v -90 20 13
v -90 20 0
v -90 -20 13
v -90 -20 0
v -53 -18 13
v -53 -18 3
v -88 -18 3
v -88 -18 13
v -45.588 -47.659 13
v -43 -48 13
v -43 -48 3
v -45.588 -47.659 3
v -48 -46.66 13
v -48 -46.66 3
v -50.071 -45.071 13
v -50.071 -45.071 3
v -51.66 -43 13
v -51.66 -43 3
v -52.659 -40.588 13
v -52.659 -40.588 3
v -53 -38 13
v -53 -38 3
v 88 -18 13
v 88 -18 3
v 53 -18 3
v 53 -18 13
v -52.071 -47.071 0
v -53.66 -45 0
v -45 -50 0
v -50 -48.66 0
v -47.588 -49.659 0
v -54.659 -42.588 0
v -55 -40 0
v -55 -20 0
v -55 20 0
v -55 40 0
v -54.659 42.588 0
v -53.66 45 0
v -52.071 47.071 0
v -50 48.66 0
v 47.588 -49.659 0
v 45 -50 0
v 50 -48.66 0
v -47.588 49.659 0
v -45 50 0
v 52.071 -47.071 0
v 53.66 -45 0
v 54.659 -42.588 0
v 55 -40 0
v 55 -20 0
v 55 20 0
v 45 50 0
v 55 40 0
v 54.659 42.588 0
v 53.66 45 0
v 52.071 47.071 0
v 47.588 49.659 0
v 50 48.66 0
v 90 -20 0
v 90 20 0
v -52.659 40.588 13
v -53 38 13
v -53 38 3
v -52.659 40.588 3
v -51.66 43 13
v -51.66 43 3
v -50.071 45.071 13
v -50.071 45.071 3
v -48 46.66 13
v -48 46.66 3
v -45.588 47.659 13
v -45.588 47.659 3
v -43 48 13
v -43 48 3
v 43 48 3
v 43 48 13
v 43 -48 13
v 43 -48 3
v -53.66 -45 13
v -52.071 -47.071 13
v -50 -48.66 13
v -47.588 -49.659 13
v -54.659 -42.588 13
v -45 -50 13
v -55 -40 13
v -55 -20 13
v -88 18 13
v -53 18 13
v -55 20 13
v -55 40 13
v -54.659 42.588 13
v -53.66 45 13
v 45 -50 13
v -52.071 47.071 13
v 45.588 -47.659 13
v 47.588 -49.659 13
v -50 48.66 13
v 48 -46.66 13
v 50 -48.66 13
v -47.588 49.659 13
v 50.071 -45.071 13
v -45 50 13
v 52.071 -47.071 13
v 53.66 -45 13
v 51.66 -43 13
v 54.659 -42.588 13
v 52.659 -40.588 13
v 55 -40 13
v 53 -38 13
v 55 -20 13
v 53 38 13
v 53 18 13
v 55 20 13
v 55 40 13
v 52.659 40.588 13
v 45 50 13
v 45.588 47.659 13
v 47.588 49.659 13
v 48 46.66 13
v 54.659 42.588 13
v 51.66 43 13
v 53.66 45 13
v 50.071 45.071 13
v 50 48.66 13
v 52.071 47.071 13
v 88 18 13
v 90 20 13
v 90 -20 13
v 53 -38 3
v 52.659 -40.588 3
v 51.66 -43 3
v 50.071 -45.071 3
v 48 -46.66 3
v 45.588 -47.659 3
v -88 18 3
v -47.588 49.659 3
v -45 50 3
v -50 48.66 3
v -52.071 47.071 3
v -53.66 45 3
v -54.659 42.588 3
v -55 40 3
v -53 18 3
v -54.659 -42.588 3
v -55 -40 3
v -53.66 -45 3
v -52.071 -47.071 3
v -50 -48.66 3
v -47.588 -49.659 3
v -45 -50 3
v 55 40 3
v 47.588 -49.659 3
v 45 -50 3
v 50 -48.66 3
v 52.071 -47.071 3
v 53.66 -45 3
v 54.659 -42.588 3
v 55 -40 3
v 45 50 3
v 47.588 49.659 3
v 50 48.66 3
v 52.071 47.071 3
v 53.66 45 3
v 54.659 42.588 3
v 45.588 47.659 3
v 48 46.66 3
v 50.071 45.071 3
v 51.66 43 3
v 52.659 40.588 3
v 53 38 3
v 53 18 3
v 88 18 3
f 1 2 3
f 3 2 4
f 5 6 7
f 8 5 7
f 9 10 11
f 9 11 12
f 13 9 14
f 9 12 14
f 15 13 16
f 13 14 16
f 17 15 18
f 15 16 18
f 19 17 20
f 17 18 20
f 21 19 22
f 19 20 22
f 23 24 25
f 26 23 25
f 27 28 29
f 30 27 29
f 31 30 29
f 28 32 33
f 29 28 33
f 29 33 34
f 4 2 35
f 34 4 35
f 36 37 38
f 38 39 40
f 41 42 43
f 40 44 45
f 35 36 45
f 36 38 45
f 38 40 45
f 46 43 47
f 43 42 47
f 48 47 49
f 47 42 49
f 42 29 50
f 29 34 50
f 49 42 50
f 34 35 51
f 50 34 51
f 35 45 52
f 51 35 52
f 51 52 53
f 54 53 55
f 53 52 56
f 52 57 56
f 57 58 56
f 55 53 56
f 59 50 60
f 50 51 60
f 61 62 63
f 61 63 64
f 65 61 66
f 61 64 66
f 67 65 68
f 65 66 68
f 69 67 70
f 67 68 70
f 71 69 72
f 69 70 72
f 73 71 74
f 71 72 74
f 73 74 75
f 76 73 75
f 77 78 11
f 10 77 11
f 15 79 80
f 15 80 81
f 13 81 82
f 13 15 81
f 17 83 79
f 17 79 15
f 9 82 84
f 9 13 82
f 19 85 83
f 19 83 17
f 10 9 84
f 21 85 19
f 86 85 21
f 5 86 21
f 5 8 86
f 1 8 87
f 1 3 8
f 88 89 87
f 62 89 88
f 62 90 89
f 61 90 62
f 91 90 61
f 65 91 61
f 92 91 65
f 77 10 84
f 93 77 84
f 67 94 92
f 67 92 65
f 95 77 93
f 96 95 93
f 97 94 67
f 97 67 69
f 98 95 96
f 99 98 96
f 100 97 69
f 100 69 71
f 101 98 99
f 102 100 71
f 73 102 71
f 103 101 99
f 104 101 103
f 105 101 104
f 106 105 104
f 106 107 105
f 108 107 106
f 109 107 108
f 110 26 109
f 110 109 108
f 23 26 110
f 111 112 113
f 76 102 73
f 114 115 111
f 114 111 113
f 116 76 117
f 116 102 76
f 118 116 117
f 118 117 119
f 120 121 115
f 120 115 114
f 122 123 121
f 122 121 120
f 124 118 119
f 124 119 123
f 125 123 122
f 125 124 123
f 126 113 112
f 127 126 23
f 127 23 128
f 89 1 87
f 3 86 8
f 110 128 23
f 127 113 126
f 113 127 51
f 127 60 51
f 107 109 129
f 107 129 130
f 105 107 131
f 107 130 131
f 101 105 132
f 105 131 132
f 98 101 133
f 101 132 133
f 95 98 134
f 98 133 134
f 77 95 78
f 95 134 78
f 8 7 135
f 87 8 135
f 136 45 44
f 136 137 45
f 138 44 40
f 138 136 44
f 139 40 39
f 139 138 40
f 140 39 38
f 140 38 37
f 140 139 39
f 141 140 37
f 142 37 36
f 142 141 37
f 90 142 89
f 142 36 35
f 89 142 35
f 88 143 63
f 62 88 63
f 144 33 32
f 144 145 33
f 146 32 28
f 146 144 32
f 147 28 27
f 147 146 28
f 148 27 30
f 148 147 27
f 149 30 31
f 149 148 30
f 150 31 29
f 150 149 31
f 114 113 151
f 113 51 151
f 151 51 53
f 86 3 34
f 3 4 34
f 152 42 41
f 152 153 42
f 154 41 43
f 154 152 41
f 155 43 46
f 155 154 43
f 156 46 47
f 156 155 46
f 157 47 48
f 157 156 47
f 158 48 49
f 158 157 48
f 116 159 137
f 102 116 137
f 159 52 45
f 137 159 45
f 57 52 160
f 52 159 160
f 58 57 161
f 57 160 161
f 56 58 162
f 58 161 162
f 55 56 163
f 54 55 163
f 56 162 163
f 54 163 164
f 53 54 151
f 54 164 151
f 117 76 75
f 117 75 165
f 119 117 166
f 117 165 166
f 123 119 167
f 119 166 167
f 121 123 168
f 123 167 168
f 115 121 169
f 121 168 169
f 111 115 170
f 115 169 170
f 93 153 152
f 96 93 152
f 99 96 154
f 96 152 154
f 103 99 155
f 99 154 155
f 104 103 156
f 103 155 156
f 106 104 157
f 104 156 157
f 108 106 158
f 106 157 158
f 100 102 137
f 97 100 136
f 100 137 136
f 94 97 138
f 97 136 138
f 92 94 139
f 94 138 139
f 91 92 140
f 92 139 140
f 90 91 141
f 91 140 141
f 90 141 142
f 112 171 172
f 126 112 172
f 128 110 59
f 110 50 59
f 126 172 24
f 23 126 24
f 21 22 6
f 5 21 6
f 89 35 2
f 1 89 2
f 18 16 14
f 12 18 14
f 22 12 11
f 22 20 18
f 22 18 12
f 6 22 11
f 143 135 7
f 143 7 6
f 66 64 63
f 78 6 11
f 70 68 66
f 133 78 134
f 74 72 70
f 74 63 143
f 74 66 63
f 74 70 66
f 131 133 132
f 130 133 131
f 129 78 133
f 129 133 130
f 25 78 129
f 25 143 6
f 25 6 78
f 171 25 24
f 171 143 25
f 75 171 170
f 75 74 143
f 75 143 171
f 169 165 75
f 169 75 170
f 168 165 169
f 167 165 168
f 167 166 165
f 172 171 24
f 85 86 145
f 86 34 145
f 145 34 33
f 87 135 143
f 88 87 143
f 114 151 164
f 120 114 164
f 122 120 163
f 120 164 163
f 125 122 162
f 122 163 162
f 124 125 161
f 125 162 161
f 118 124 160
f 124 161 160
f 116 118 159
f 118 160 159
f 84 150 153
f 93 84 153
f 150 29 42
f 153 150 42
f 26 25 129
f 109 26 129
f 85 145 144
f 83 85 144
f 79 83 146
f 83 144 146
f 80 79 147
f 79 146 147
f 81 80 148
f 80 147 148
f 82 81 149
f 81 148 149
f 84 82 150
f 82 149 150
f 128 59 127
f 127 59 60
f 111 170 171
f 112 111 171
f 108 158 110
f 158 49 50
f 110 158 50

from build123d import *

# Parameters (mm, degrees)
F1_DEPTH = 3
F2_R     = 10
F4_DEPTH = 10


with BuildPart() as f1:
    # F0 (on Top) → F1 (new body)
    with BuildSketch(Plane.XY):
        Polygon((55, 50), (-55, 50), (-55, 20), (-90, 20), (-90, -20), (-55, -20), (-55, -50), (55, -50), (55, -20), (90, -20), (90, 20), (55, 20), align=None)
    extrude(amount=F1_DEPTH)

    # F2
    f2_edges = [f1.edges().sort_by_distance(p)[0] for p in [
        (-55, 50, 1.5),
        (55, 50, 1.5),
        (55, -50, 1.5),
        (-55, -50, 1.5),
    ]]
    fillet(f2_edges, radius=F2_R)

    # F3 (on face) → F4 (join)
    with BuildSketch(Plane.XY.offset(3)):
        Polygon((-55, 20), (-90, 20), (-90, -20), (-55, -20), (-55, -18), (-88, -18), (-88, 18), (-55, 18), align=None)
        with BuildLine():
            Line((-55, 40), (-55, 20))
            Line((-55, 20), (-55, 18))
            Line((-55, 18), (-53, 18))
            Line((-53, 18), (-53, 38))
            ThreePointArc((-53, 38), (-50.071068, 45.071068), (-43, 48))
            Line((-43, 48), (43, 48))
            ThreePointArc((43, 48), (50.071068, 45.071068), (53, 38))
            Line((53, 38), (53, 18))
            Line((53, 18), (55, 18))
            Line((55, 18), (55, 20))
            Line((55, 20), (55, 40))
            ThreePointArc((55, 40), (52.071068, 47.071068), (45, 50))
            Line((45, 50), (-45, 50))
            ThreePointArc((-45, 50), (-52.071068, 47.071068), (-55, 40))
        make_face()
        with BuildLine():
            Line((-55, -18), (-55, -20))
            Line((-55, -20), (-55, -40))
            ThreePointArc((-55, -40), (-52.071068, -47.071068), (-45, -50))
            Line((-45, -50), (45, -50))
            ThreePointArc((45, -50), (52.071068, -47.071068), (55, -40))
            Line((55, -40), (55, -20))
            Line((55, -20), (55, -18))
            Line((55, -18), (53, -18))
            Line((53, -18), (53, -38))
            ThreePointArc((53, -38), (50.071068, -45.071068), (43, -48))
            Line((43, -48), (-43, -48))
            ThreePointArc((-43, -48), (-50.071068, -45.071068), (-53, -38))
            Line((-53, -38), (-53, -18))
            Line((-53, -18), (-55, -18))
        make_face()
        Polygon((90, 20), (55, 20), (55, 18), (88, 18), (88, -18), (55, -18), (55, -20), (90, -20), align=None)
    extrude(amount=F4_DEPTH)


solid = f1.part
